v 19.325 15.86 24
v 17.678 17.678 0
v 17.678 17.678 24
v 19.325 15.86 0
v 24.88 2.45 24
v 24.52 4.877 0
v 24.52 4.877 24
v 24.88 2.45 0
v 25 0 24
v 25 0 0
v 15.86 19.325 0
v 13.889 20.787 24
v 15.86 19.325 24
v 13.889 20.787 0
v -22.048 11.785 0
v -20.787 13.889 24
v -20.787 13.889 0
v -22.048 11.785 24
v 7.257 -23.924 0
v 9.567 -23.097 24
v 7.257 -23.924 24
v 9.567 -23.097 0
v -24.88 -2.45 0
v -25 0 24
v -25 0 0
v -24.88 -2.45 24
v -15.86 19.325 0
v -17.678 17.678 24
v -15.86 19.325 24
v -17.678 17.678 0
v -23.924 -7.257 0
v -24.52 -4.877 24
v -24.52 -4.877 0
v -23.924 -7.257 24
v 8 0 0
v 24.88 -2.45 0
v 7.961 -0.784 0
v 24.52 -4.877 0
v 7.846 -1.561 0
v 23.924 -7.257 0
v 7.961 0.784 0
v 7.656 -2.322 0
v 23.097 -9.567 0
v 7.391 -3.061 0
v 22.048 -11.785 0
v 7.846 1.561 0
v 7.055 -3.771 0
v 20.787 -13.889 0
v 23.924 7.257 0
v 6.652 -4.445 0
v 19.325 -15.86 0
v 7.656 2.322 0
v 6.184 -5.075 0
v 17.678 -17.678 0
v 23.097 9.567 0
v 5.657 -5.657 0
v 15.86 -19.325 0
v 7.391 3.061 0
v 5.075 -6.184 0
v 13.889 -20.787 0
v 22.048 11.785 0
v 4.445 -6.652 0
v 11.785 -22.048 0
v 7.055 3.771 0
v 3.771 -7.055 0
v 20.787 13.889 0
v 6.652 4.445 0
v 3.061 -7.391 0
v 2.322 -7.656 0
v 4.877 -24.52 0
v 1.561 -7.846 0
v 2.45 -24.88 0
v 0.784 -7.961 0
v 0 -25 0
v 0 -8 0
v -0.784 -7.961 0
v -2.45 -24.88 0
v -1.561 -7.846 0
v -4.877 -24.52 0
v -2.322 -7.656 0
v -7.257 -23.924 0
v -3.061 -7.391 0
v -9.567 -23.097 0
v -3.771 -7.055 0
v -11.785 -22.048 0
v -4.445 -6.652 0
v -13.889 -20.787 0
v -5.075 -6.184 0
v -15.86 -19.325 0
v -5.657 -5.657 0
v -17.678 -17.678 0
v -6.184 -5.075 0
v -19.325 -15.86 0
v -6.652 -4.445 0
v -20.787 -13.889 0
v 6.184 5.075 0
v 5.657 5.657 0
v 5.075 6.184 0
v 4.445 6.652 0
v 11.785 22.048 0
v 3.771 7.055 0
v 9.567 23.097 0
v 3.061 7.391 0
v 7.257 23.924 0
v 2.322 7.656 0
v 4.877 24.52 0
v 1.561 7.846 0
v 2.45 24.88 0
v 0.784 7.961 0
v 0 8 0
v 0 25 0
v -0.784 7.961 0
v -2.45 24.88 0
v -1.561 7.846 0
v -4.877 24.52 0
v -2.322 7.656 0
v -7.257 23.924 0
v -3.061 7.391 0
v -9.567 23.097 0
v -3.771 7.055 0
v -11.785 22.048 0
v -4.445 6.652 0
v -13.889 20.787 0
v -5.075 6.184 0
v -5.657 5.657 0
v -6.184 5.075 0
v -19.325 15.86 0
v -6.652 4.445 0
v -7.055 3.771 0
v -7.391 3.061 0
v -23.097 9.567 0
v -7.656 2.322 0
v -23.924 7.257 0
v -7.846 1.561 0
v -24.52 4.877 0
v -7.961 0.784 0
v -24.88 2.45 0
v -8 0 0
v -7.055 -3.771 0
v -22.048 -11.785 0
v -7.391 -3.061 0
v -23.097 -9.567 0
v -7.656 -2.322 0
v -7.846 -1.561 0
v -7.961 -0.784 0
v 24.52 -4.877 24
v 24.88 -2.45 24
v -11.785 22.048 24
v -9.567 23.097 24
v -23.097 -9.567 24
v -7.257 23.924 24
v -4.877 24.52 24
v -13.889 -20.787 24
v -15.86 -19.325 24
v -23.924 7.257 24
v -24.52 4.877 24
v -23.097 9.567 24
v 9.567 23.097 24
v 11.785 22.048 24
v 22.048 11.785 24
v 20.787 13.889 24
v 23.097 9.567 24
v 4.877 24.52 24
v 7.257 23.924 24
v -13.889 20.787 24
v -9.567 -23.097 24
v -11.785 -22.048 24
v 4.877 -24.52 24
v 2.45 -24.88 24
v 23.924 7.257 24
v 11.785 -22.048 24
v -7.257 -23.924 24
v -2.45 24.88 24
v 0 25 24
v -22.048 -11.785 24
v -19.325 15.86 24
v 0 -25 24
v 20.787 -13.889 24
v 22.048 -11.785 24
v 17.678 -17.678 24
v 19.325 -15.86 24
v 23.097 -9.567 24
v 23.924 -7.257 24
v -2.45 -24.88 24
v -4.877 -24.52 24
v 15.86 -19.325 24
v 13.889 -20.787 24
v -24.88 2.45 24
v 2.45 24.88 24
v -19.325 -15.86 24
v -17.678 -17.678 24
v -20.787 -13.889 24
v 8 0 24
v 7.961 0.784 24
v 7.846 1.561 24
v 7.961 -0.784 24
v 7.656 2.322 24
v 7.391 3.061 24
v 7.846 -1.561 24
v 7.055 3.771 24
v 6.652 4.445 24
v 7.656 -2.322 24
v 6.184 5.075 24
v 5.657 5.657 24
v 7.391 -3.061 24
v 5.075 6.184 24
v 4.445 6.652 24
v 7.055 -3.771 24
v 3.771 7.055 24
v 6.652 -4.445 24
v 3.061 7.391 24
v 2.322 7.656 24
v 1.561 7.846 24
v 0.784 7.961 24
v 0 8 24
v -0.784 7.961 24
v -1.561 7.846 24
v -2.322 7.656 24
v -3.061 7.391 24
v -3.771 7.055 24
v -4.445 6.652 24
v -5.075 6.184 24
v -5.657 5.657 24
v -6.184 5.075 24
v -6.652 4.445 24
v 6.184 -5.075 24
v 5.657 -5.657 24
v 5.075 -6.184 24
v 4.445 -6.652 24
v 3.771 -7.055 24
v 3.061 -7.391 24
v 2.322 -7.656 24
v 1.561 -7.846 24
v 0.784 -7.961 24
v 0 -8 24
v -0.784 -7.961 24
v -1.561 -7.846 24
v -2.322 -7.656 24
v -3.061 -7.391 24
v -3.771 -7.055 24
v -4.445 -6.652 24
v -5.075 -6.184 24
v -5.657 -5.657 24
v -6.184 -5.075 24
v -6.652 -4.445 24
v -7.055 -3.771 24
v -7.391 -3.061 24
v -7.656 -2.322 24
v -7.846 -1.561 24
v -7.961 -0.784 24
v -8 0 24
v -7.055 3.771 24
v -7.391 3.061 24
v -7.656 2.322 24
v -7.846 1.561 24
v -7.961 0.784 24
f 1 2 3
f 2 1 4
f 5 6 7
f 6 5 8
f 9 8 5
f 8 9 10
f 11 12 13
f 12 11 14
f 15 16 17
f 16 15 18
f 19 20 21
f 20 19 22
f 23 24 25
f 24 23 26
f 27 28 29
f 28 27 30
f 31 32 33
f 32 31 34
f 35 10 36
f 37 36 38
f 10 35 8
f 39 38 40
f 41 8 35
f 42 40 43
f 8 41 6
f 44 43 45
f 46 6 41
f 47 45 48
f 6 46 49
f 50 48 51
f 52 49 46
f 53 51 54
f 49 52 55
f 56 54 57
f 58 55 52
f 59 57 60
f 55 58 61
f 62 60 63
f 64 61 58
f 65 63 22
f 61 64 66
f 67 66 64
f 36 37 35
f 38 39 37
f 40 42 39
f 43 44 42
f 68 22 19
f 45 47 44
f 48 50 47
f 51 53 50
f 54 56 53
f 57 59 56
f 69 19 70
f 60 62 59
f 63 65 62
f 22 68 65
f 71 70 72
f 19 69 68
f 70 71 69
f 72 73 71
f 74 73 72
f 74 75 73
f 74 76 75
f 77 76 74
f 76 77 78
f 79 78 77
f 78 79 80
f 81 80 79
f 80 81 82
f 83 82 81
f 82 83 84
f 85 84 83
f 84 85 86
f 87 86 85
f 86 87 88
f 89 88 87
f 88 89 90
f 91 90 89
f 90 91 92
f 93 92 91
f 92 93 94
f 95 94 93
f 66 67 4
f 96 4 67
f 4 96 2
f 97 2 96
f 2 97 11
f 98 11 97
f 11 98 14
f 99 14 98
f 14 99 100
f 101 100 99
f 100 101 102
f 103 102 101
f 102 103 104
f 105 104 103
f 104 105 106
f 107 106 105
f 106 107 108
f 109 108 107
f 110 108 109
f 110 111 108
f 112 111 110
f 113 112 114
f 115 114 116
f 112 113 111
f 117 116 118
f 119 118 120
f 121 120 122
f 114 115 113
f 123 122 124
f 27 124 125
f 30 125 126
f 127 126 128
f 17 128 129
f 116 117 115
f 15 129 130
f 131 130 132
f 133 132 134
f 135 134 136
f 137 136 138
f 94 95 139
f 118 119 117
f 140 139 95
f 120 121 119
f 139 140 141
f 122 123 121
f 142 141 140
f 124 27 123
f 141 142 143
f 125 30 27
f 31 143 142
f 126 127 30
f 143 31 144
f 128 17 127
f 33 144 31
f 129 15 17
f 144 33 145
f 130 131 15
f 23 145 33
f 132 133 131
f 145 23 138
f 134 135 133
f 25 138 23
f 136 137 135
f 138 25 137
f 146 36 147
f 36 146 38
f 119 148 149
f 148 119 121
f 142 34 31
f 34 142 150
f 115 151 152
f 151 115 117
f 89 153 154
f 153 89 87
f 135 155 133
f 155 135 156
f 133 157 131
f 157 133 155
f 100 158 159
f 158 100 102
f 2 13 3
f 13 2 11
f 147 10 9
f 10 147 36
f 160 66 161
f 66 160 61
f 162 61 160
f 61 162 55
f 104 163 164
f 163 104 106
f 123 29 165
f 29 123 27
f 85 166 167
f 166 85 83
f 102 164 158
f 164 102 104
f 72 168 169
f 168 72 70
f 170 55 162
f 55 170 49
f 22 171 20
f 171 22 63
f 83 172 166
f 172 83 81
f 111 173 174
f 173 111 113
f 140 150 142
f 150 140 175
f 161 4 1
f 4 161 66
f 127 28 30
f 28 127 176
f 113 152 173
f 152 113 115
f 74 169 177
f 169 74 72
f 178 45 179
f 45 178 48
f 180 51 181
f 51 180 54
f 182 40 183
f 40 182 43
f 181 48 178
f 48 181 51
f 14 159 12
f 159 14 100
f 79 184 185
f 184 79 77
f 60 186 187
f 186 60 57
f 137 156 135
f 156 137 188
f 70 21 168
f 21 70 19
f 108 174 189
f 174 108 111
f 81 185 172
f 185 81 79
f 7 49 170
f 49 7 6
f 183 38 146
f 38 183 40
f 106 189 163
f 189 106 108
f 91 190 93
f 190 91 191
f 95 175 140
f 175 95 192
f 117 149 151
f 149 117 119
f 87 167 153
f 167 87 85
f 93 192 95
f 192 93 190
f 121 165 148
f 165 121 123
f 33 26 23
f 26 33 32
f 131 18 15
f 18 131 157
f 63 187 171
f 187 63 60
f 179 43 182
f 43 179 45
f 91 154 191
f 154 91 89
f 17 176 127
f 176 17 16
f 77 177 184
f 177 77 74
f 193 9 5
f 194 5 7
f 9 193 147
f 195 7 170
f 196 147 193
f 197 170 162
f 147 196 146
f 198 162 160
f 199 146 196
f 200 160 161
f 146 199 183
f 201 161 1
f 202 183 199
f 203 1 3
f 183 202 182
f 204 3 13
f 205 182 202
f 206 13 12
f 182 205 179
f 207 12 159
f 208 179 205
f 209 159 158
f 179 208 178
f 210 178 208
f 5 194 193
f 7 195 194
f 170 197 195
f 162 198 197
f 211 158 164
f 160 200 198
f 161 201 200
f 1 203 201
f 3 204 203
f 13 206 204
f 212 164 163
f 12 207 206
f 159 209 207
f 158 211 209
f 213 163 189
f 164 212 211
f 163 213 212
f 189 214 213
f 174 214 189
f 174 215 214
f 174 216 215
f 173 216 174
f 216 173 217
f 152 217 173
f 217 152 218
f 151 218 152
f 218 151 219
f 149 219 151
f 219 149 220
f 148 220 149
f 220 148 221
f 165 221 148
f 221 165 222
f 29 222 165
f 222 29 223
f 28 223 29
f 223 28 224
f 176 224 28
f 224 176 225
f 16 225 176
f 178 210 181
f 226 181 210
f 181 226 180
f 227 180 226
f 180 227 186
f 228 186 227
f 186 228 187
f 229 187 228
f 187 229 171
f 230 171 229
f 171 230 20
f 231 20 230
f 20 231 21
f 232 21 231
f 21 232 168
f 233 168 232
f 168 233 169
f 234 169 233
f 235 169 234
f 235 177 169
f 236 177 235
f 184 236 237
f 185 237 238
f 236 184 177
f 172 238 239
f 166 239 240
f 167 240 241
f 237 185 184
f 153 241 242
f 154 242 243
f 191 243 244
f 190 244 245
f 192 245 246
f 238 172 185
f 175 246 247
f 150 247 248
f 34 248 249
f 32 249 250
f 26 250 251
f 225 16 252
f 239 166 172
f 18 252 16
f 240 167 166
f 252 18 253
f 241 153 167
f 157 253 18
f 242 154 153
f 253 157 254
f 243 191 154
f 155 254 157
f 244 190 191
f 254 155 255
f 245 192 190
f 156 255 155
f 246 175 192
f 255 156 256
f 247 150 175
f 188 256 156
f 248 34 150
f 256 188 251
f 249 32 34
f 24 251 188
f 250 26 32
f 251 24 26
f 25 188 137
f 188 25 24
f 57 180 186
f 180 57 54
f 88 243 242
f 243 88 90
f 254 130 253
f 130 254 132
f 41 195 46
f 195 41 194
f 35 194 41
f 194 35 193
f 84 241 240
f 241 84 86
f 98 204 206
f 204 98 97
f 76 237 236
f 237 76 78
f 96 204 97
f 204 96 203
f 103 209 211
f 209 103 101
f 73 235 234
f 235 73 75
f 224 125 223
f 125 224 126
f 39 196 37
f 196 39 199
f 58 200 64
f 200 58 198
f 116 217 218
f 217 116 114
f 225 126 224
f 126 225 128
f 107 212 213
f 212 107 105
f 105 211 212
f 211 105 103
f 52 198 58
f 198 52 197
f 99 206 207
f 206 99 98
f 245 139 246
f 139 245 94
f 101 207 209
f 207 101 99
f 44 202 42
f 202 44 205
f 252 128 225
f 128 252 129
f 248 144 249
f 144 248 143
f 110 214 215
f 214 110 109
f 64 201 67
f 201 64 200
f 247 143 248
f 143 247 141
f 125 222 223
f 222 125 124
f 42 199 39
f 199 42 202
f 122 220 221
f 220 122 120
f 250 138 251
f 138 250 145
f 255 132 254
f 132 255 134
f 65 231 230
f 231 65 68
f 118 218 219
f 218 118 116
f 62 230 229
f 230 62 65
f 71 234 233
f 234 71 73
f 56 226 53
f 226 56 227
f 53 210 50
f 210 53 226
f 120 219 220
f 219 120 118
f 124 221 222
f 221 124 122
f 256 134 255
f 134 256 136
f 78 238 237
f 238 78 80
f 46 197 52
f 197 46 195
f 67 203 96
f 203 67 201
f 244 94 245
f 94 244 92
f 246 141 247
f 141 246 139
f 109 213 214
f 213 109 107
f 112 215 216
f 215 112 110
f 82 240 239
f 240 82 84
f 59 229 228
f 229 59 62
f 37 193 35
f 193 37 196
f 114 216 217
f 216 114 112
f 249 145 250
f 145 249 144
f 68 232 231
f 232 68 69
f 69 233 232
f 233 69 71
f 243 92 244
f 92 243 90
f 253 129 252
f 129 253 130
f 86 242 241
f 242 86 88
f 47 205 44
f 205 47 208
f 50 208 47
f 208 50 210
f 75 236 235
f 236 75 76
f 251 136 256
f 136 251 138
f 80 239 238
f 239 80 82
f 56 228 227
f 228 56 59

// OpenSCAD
// Starter file for task-012.
// Edit this file in OpenSCAD to complete the requested hard task.
$fn = 64;

difference() {
    cylinder(d=50, h=24);
    translate([0,0,-1]) cylinder(d=16, h=26);
}
